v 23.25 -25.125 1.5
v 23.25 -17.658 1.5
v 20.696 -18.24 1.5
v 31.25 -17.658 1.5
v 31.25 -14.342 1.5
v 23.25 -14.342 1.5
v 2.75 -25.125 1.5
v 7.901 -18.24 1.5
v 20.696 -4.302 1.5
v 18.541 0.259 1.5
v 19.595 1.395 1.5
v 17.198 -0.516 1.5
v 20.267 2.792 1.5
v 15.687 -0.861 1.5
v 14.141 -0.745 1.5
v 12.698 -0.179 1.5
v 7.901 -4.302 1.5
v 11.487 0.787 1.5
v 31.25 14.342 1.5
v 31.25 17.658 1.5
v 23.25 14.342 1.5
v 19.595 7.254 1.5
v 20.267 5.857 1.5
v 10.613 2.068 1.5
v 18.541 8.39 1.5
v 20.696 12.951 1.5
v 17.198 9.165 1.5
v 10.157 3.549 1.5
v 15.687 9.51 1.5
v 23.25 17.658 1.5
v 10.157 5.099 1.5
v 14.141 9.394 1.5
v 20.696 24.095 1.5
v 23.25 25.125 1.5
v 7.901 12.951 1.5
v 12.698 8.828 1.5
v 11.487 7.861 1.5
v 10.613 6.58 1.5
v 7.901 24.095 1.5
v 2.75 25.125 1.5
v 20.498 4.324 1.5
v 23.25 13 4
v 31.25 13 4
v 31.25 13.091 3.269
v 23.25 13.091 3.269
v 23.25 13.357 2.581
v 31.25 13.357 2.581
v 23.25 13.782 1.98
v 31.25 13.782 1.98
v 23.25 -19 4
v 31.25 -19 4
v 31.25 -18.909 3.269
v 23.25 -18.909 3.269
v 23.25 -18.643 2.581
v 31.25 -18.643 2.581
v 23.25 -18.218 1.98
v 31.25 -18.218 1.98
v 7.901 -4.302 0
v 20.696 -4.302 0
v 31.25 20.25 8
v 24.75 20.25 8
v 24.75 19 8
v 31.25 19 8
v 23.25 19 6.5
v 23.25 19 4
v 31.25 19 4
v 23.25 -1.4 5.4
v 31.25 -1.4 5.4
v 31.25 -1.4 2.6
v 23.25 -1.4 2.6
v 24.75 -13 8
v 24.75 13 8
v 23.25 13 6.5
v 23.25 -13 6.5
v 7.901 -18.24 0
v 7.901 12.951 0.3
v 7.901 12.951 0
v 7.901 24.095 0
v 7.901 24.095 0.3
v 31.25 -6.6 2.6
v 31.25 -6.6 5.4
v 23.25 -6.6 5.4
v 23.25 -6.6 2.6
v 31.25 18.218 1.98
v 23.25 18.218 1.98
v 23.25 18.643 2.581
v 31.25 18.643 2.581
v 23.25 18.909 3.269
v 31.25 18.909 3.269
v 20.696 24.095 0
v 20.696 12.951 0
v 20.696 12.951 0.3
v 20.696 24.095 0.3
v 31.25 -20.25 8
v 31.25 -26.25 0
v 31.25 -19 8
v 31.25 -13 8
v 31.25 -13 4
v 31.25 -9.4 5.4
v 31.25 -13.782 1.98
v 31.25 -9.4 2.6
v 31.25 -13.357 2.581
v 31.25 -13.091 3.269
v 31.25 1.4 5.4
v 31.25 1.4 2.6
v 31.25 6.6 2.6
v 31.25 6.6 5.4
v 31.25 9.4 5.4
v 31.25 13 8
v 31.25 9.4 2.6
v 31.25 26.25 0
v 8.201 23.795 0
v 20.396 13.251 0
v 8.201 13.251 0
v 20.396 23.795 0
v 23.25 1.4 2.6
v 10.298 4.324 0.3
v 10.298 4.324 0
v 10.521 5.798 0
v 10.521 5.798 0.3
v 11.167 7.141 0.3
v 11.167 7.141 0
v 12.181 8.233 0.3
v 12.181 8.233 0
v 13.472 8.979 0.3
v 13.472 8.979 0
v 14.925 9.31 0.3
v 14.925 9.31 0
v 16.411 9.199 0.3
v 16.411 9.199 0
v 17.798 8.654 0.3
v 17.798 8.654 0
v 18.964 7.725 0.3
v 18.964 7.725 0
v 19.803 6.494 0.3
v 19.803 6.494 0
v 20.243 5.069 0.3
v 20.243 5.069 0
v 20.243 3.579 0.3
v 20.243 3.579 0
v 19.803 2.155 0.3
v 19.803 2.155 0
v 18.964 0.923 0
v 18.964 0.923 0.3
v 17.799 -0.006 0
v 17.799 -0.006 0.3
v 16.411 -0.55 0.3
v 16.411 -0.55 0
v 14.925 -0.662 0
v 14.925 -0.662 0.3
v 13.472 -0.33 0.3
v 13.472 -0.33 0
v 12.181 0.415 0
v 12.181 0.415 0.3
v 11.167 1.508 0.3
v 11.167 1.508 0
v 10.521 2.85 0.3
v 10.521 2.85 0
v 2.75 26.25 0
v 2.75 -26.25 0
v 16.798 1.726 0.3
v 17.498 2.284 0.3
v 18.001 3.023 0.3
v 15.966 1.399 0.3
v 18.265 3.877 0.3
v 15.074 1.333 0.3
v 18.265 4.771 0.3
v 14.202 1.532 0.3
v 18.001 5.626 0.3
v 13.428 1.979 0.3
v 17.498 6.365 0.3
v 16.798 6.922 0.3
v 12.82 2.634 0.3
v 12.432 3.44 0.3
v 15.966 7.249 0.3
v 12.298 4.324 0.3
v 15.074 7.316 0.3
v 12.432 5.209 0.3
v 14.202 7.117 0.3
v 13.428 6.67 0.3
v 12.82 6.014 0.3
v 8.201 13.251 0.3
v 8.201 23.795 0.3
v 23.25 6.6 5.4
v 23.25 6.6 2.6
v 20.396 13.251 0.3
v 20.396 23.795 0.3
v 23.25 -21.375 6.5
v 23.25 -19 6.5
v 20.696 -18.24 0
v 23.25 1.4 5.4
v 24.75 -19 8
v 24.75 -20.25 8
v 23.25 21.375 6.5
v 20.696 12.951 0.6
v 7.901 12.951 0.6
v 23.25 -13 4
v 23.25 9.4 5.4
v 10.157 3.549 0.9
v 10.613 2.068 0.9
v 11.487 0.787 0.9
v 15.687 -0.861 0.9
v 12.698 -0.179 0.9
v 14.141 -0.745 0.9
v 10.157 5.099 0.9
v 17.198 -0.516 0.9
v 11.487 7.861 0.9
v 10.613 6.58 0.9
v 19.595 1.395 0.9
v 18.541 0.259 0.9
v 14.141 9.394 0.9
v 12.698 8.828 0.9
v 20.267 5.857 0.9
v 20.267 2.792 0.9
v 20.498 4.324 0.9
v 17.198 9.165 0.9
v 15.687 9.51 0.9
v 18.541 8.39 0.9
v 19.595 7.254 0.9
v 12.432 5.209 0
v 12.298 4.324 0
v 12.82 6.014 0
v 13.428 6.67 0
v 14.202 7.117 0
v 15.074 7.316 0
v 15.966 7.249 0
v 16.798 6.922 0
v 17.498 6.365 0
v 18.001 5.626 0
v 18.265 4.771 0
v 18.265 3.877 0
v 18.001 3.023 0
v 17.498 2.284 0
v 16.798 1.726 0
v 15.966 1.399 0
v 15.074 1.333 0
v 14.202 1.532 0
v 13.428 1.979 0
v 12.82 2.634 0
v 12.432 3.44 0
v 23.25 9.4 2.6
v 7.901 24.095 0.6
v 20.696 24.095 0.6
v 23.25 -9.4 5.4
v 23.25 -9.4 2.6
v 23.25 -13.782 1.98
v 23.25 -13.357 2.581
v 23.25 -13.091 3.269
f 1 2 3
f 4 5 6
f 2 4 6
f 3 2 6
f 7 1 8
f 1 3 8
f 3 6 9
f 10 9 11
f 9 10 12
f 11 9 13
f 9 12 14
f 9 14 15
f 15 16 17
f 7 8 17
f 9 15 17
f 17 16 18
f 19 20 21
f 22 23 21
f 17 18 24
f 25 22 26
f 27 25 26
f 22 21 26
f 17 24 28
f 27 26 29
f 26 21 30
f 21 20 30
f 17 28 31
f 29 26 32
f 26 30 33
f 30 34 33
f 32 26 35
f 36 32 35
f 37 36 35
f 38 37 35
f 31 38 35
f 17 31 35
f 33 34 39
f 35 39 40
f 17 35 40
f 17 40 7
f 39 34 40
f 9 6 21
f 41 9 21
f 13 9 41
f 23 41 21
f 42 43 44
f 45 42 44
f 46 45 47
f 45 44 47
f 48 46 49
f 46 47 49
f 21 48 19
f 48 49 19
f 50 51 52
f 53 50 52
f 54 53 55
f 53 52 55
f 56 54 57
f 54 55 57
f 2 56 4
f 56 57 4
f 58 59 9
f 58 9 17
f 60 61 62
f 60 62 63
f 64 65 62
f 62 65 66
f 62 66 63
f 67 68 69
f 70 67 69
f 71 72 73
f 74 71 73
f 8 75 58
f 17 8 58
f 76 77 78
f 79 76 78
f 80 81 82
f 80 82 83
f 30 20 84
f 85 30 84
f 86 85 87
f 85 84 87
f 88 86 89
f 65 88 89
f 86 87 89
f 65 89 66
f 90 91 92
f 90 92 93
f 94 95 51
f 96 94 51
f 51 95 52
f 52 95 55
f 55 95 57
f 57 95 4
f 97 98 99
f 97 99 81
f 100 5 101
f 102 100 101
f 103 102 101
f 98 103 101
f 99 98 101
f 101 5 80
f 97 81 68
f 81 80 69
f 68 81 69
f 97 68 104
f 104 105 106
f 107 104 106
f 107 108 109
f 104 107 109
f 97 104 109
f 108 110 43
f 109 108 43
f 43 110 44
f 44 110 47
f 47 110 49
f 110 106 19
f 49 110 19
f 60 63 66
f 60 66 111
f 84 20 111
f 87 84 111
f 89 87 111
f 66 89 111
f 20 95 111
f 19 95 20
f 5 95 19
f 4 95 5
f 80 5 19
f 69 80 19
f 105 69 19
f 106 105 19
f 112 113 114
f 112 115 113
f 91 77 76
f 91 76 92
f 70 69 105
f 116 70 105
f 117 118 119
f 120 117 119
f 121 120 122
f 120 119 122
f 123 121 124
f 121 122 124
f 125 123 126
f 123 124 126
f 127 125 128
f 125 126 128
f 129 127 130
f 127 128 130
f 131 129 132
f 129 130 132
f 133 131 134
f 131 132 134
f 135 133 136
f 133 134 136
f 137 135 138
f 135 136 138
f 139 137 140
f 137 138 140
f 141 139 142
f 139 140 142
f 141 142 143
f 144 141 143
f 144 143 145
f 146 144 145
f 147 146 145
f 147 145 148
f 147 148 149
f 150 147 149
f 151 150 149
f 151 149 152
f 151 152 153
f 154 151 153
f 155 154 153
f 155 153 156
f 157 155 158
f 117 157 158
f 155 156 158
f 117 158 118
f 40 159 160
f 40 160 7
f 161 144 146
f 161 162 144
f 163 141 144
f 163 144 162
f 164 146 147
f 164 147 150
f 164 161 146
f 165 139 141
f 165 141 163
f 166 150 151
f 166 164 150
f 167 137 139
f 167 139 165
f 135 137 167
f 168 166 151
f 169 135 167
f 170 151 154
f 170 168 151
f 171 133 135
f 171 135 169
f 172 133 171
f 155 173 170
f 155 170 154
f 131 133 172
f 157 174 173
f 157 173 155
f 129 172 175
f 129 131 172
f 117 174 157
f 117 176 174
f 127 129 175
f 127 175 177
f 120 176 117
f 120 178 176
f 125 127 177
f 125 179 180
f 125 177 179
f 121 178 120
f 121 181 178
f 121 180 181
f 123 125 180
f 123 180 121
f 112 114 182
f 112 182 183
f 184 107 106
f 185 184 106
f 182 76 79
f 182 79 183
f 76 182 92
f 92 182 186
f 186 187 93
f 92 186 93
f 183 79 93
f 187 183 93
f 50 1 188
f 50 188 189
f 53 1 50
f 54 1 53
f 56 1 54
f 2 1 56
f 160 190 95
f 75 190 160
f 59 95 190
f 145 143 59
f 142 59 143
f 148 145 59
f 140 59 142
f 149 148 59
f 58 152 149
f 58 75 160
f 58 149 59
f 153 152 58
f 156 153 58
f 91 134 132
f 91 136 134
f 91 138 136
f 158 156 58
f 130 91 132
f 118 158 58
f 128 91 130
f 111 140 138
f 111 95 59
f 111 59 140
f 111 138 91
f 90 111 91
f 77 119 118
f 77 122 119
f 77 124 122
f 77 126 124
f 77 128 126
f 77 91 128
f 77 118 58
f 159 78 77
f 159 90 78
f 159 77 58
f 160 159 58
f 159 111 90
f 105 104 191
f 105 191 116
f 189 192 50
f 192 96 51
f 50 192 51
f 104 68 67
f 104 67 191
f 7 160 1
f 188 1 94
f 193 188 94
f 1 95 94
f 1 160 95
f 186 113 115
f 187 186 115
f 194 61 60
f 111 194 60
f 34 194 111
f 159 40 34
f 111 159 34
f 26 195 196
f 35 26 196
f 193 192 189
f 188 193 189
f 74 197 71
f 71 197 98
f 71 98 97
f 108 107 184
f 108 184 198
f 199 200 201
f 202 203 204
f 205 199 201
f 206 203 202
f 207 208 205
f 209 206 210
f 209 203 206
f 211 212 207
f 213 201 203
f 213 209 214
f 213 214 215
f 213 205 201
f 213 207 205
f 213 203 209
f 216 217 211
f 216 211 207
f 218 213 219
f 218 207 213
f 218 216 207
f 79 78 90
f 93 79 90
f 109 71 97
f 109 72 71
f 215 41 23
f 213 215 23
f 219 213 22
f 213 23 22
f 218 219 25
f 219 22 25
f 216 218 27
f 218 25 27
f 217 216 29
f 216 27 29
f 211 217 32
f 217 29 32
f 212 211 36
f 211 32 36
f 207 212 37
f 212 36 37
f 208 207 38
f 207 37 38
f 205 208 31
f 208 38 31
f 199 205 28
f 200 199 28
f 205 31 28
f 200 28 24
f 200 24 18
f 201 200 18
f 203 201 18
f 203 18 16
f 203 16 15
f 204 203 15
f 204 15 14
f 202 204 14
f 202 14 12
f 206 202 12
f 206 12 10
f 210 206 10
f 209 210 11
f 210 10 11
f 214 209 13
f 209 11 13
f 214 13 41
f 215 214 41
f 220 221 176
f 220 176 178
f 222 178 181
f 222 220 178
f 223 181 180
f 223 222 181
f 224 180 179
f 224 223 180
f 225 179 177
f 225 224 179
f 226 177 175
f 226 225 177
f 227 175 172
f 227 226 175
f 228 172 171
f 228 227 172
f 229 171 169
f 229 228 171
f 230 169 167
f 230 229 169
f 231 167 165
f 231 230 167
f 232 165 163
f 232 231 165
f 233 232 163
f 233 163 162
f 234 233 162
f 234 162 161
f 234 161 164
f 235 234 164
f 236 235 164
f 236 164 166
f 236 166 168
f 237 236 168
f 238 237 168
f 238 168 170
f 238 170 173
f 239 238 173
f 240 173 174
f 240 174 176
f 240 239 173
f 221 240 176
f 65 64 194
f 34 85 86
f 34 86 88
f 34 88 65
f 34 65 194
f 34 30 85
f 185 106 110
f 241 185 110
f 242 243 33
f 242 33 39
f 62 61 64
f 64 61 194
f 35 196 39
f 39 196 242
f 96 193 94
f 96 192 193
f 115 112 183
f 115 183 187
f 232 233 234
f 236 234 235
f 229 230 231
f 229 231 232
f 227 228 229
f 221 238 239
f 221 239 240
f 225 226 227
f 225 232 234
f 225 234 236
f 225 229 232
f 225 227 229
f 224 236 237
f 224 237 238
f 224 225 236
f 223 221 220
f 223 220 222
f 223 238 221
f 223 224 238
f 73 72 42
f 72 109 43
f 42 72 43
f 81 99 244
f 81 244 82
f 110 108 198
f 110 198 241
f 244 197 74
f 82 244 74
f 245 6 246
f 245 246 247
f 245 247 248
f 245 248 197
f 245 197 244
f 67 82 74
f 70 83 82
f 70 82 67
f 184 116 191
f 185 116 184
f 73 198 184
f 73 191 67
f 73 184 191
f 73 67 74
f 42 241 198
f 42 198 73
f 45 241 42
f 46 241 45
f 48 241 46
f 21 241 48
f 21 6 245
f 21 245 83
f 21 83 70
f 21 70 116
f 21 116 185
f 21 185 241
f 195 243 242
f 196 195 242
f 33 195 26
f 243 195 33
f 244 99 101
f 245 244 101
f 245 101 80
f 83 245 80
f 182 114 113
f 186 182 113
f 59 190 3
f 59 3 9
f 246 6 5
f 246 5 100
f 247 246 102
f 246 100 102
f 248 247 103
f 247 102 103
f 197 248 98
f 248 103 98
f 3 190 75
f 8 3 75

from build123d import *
from build123d.topology import SkipClean

# Parameters (mm, degrees)
ESBO_O1_R                 = 8.3
RESSALTO_EXTRUS_O1_DEPTH  = 1.5
RESSALTO_EXTRUS_O2_DEPTH  = 6
ESBO_O3_W                 = 2.8
ESBO_O3_H                 = 2.8
CORTE_EXTRUS_O1_DEPTH     = 37.142080737
ESBO_O4_W                 = 2.8
ESBO_O4_H                 = 2.8
CORTE_EXTRUS_O2_DEPTH     = 53.08166664
ESBO_O6_W                 = 5
ESBO_O6_H                 = 25
RESSALTO_EXTRUS_O5_DEPTH  = 7.5
ESBO_O7_W                 = 2.8
ESBO_O7_H                 = 2.8
CORTE_EXTRUS_O3_DEPTH     = 60
RESSALTO_EXTRUS_O3_DEPTH  = 10
ESBO_O8_W                 = 60
ESBO_O8_H                 = 52.5
ESBO_O8_R                 = 8.3
RESSALTO_EXTRUS_O6_DEPTH  = 1.5
CORTE_EXTRUS_O4_DEPTH     = 42.098205557
RESSALTO_EXTRUS_O7_DEPTH  = 6.5
ESBO_O14_W                = 5.7
ESBO_O14_H                = 52.5
CORTE_EXTRUS_O8_DEPTH     = 4.5
CORTE_EXTRUS_O9_DEPTH     = 41.657871317
CORTE_EXTRUS_O13_DEPTH    = 6.25
CORTE_EXTRUS_O14_DEPTH    = 6.25
ESBO_O12_R                = 1.65
CORTE_EXTRUS_O15_DEPTH    = 4.5
CORTE_EXTRUS_O17_DEPTH    = 62.398717413
ESBO_O20_R                = 3.5
CORTE_EXTRUS_O18_DEPTH    = 5
RESSALTO_EXTRUS_O8_START  = 2.95
ESBO_O21_R                = 1.65
RESSALTO_EXTRUS_O8_DEPTH  = 2.95
ESBO_O22_W                = 2.8
ESBO_O22_H                = 2.8
RESSALTO_EXTRUS_O9_DEPTH  = 1.25
CORTE_EXTRUS_O19_DEPTH    = 6
ESBO_O24_W                = 8
ESBO_O24_H                = 50.25
RESSALTO_EXTRUS_O10_DEPTH = 6.5
CORTE_EXTRUS_O20_DEPTH    = 62.222570389
CORTE_EXTRUS_O21_REACH    = 67.143
ESBO_O26_W                = 2.8
ESBO_O26_H                = 2.8
CORTE_EXTRUS_O22_REACH    = 67.143
CORTE_EXTRUS_O23_DEPTH    = 6.5
CORTE_EXTRUS_O24_DEPTH    = 6.5
CORTE_EXTRUS_O25_START    = -6.5
CORTE_EXTRUS_O25_DEPTH    = 6.5
CORTE_EXTRUS_O26_DEPTH    = 4.95
ESBO_O33_R                = 9.3
CORTE_EXTRUS_O27_DEPTH    = 43.019340785
ESBO_O34_R                = 8.3
RESSALTO_EXTRUS_O11_DEPTH = 1.5
ESBO_O49_R                = 41.403192139
CORTE_EXTRUS_O37_DEPTH    = 28.5
ESBO_O50_W                = 12.795
ESBO_O50_H                = 13.938
ESBO_O50_H_2              = 11.144
CORTE_EXTRUS_O38_DEPTH    = 42.588760501
ESBO_O51_R                = 5.2
CORTE_EXTRUS_O39_DEPTH    = 0.6
ESBO_O52_R                = 31.470560184
CORTE_EXTRUS_O40_DEPTH    = 1.5
ESBO_O54_R                = 5
ESBO_O54_R_2              = 3
CORTE_EXTRUS_O41_DEPTH    = 0.3
ESBO_O56_W                = 12.795
ESBO_O56_H                = 11.144
RESSALTO_EXTRUS_O13_DEPTH = 0.6
ESBO_O57_W                = 12.795
ESBO_O57_H                = 11.144
ESBO_O57_W_2              = 12.195
ESBO_O57_H_2              = 10.544
CORTE_EXTRUS_O44_DEPTH    = 0.3


with BuildPart() as part:
    # Esboço1 → Ressalto-extrusão1 (new body)
    with BuildSketch(Plane.XY):
        Polygon((-25, -12.5), (-25, 12.5), (25, 12.5), (25, -12.5), (15, -12.5), (-15, -12.5), align=None)
        with Locations((-13, 0)):
            Circle(ESBO_O1_R, mode=Mode.SUBTRACT)
        with Locations(Location((13, 0, 0), (0, 0, 180))):
            Circle(ESBO_O1_R, mode=Mode.SUBTRACT)
    extrude(amount=RESSALTO_EXTRUS_O1_DEPTH)

    # Esboço2 → Ressalto-extrusão2 (add)
    with BuildSketch(Plane.XY.offset(1.5)):
        Polygon((-20, -12.5), (-25, -12.5), (-25, -2.5), (-22, -2.5), (-22, -9.5), (-15, -9.5), (-15, -12.5), align=None)
        Polygon((22, -2.5), (22, -9.5), (15, -9.5), (15, -12.5), (20, -12.5), (25, -12.5), (25, -2.5), align=None)
        Polygon((20, 12.5), (25, 12.5), (25, 2.5), (22, 2.5), (22, 9.5), (15, 9.5), (15, 12.5), align=None)
        Polygon((-22, 2.5), (-22, 9.5), (-15, 9.5), (-15, 12.5), (-20, 12.5), (-25, 12.5), (-25, 2.5), align=None)
    extrude(amount=RESSALTO_EXTRUS_O2_DEPTH)

    # Esboço3 → Corte-extrusão1 (cut, through all)
    with BuildSketch(Plane.XZ.offset(12.5)):
        with Locations((-20, 3.75)):
            Rectangle(ESBO_O3_W, ESBO_O3_H)
        with Locations((20, 3.75)):
            Rectangle(ESBO_O3_W, ESBO_O3_H)
    extrude(amount=-CORTE_EXTRUS_O1_DEPTH, mode=Mode.SUBTRACT)

    # Esboço4 → Corte-extrusão2 (cut, through all)
    with BuildSketch(Plane.ZY.offset(25)):
        with Locations((3.75, 7.5)):
            Rectangle(ESBO_O4_W, ESBO_O4_H)
        with Locations((3.75, -7.5)):
            Rectangle(ESBO_O4_W, ESBO_O4_H)
    extrude(amount=-CORTE_EXTRUS_O2_DEPTH, mode=Mode.SUBTRACT)

    # Esboço6 → Ressalto-extrusão5 (add)
    with BuildSketch(Plane(origin=(0, 0, 0), x_dir=(-1, 0, 0), z_dir=(0, 0, -1))):
        with Locations((-27.5, 0)):
            Rectangle(ESBO_O6_W, ESBO_O6_H)
        with Locations((27.5, 0)):
            Rectangle(ESBO_O6_W, ESBO_O6_H)
    extrude(amount=-RESSALTO_EXTRUS_O5_DEPTH)

    # Esboço7 → Corte-extrusão3 (cut)
    with BuildSketch(Plane(origin=(30, 0, 0), x_dir=(0, 0, -1), z_dir=(1, 0, 0))):
        with Locations((-3.75, -7.5)):
            Rectangle(ESBO_O7_W, ESBO_O7_H)
        with Locations((-3.75, 7.5)):
            Rectangle(ESBO_O7_W, ESBO_O7_H)
    extrude(amount=-CORTE_EXTRUS_O3_DEPTH, mode=Mode.SUBTRACT)

    # Esboço5 → Ressalto-extrusão3 (add)
    with SkipClean():  # the faces are left unmerged after this step: merging them gives an invalid solid
        with BuildSketch(Plane.XY.offset(1.5)):
            with BuildLine():
                Line((-9, -7.272551134), (-9, -8.395832299))
                ThreePointArc((-9, -8.395832299), (-3.7, 0), (-9, 8.395832299))
                Line((-9, 8.395832299), (-9, 7.272551134))
                ThreePointArc((-9, 7.272551134), (-4.7, 0), (-9, -7.272551134))
            make_face()
            with BuildLine():
                Line((-17, -7.272551134), (-17, -8.395832299))
                ThreePointArc((-17, -8.395832299), (-22.3, 0), (-17, 8.395832299))
                Line((-17, 8.395832299), (-17, 7.272551134))
                ThreePointArc((-17, 7.272551134), (-21.3, 0), (-17, -7.272551134))
            make_face()
            with BuildLine():
                Line((9, -7.272551134), (9, -8.395832299))
                ThreePointArc((9, -8.395832299), (3.7, 0), (9, 8.395832299))
                Line((9, 8.395832299), (9, 7.272551134))
                ThreePointArc((9, 7.272551134), (4.7, 0), (9, -7.272551134))
            make_face()
            with BuildLine():
                Line((17, 8.395832299), (17, 7.272551134))
                ThreePointArc((17, 7.272551134), (21.3, 0), (17, -7.272551134))
                Line((17, -7.272551134), (17, -8.395832299))
                ThreePointArc((17, -8.395832299), (22.3, 0), (17, 8.395832299))
            make_face()
        extrude(amount=RESSALTO_EXTRUS_O3_DEPTH)

    # Esboço8 → Ressalto-extrusão6 (add)
    with SkipClean():  # the faces are left unmerged after this step: merging them gives an invalid solid
        with BuildSketch(Plane(origin=(0, 0, 0), x_dir=(-1, 0, 0), z_dir=(0, 0, -1))):
            Rectangle(ESBO_O8_W, ESBO_O8_H)
            with Locations(Location((13, 0, 0), (0, 0, 298.811379709))):
                Circle(ESBO_O8_R, mode=Mode.SUBTRACT)
            with Locations((-13, 0)):
                Circle(ESBO_O8_R, mode=Mode.SUBTRACT)
        extrude(amount=-RESSALTO_EXTRUS_O6_DEPTH)

    # Esboço9 → Corte-extrusão4 (cut, through all)
    with SkipClean():  # the faces are left unmerged after this step: merging them gives an invalid solid
        with BuildSketch(Plane.XY.offset(1.5)):
            Polygon((-15, -12.5), (-15, -9.5), (-22, -9.5), (-22, -2.5), (-25, -2.5), (-25, 2.5), (-22, 2.5), (-22, 9.5), (-15, 9.5), (-15, 12.5), (-30, 12.5), (-30, -12.5), align=None)
        extrude(amount=CORTE_EXTRUS_O4_DEPTH, mode=Mode.SUBTRACT)

    # Esboço10 → Ressalto-extrusão7 (add)
    with SkipClean():  # the faces are left unmerged after this step: merging them gives an invalid solid
        with BuildSketch(Plane.XY.offset(1.5)):
            Polygon((-24.3, -26.25), (-24.3, 26.25), (-22.3, 26.25), (-17.3, 26.25), (-17.3, 20), (-22.3, 20), (-22.3, 12), (-17.3, 12), (-17.3, -12), (-22.3, -12), (-22.3, -20), (-17.3, -20), (-17.3, -26.25), (-22.3, -26.25), align=None)
        extrude(amount=RESSALTO_EXTRUS_O7_DEPTH)

    # Esboço14 → Corte-extrusão8 (cut)
    with SkipClean():  # the faces are left unmerged after this step: merging them gives an invalid solid
        with BuildSketch(Plane.XY.offset(1.5)):
            with Locations((-27.15, 0)):
                Rectangle(ESBO_O14_W, ESBO_O14_H)
        extrude(amount=-CORTE_EXTRUS_O8_DEPTH, mode=Mode.SUBTRACT)

    # Esboço15 → Corte-extrusão9 (cut, through all)
    with SkipClean():  # the faces are left unmerged after this step: merging them gives an invalid solid
        with BuildSketch(Plane.XY.offset(8)):
            with BuildLine():
                Line((-17.3, -7.09929574), (-17.3, 7.09929574))
                ThreePointArc((-17.3, 7.09929574), (-21.3, 0), (-17.3, -7.09929574))
            make_face()
        extrude(amount=-CORTE_EXTRUS_O9_DEPTH, mode=Mode.SUBTRACT)

    # Esboço11 → Corte-extrusão13 (cut)
    with SkipClean():  # the faces are left unmerged after this step: merging them gives an invalid solid
        with BuildSketch(Plane.XZ.offset(26.25)):
            Polygon((-22.3, 8), (-17.3, 8), (-17.3, 1.5), align=None)
        extrude(amount=-CORTE_EXTRUS_O13_DEPTH, mode=Mode.SUBTRACT)

    # Esboço17 → Corte-extrusão14 (cut)
    with SkipClean():  # the faces are left unmerged after this step: merging them gives an invalid solid
        with BuildSketch(Plane(origin=(0, 26.25, 0), x_dir=(1, 0, 0), z_dir=(0, 1, 0))):
            Polygon((-17.3, -1.5), (-17.3, -8), (-22.3, -8), align=None)
        extrude(amount=-CORTE_EXTRUS_O14_DEPTH, mode=Mode.SUBTRACT)

    # Esboço12 → Corte-extrusão15 (cut)
    with SkipClean():  # the faces are left unmerged after this step: merging them gives an invalid solid
        with BuildSketch(Plane.ZY.offset(24.3)):
            with Locations(Location((4, 16, 0), (0, 0, 270))):
                Circle(ESBO_O12_R)
            with Locations((4, -16)):
                Circle(ESBO_O12_R)
        extrude(amount=-CORTE_EXTRUS_O15_DEPTH, mode=Mode.SUBTRACT)

    # Esboço19 → Corte-extrusão17 (cut, through all)
    with SkipClean():  # the faces are left unmerged after this step: merging them gives an invalid solid
        with BuildSketch(Plane.ZY.offset(24.3)):
            Polygon((0, 26.25), (8, 26.25), (8, 20.25), align=None)
            Polygon((8, -20.25), (0, -26.25), (8, -26.25), align=None)
        extrude(amount=-CORTE_EXTRUS_O17_DEPTH, mode=Mode.SUBTRACT)

    # Esboço20 → Corte-extrusão18 (cut)
    with SkipClean():  # the faces are left unmerged after this step: merging them gives an invalid solid
        with BuildSketch(Plane(origin=(-22.3, 0, 0), x_dir=(0, 0, -1), z_dir=(1, 0, 0))):
            with Locations((-4, -16)):
                Circle(ESBO_O20_R)
            with Locations((-4, 16)):
                Circle(ESBO_O20_R)
        extrude(amount=CORTE_EXTRUS_O18_DEPTH, mode=Mode.SUBTRACT)

    # Esboço21 → Ressalto-extrusão8 (add)
    with SkipClean():  # the faces are left unmerged after this step: merging them gives an invalid solid
        with BuildSketch(Plane.ZY.offset(24.3).offset(RESSALTO_EXTRUS_O8_START)):
            Polygon((0, 26.25), (0, -26.25), (8, -20.25), (8, 20.25), align=None)
            with Locations(Location((4, -16, 0), (0, 0, 270))):
                Circle(ESBO_O21_R, mode=Mode.SUBTRACT)
            with Locations(Location((4, 16, 0), (0, 0, 270))):
                Circle(ESBO_O21_R, mode=Mode.SUBTRACT)
        extrude(amount=-RESSALTO_EXTRUS_O8_DEPTH)

    # Esboço22 → Ressalto-extrusão9 (add)
    with SkipClean():  # the faces are left unmerged after this step: merging them gives an invalid solid
        with BuildSketch(Plane(origin=(30, 0, 0), x_dir=(0, 0, -1), z_dir=(1, 0, 0))):
            Polygon((-1.5, -25.125), (0, -26.25), (0, 26.25), (-1.5, 25.125), (-1.5, 12.5), (-7.5, 12.5), (-7.5, -12.5), (-1.5, -12.5), align=None)
            with Locations((-3.75, -7.5)):
                Rectangle(ESBO_O22_W, ESBO_O22_H, mode=Mode.SUBTRACT)
            with Locations((-3.75, 7.5)):
                Rectangle(ESBO_O22_W, ESBO_O22_H, mode=Mode.SUBTRACT)
        extrude(amount=RESSALTO_EXTRUS_O9_DEPTH)

    # Esboço23 → Corte-extrusão19 (cut)
    with SkipClean():  # the faces are left unmerged after this step: merging them gives an invalid solid
        with BuildSketch(Plane.XY.offset(7.5)):
            Polygon((25, -2.5), (22, -2.5), (22, -9.5), (15, -9.5), (15, -12.5), (31.25, -12.5), (31.25, 12.5), (15, 12.5), (15, 9.5), (22, 9.5), (22, 2.5), (25, 2.5), align=None)
        extrude(amount=-CORTE_EXTRUS_O19_DEPTH, mode=Mode.SUBTRACT)

    # Esboço24 → Ressalto-extrusão10 (add)
    with SkipClean():  # the faces are left unmerged after this step: merging them gives an invalid solid
        with BuildSketch(Plane.XY.offset(1.5)):
            with Locations((27.25, 0)):
                Rectangle(ESBO_O24_W, ESBO_O24_H)
        extrude(amount=RESSALTO_EXTRUS_O10_DEPTH)

    # Esboço25 → Corte-extrusão20 (cut, through all)
    with SkipClean():  # the faces are left unmerged after this step: merging them gives an invalid solid
        with BuildSketch(Plane(origin=(0, 25.125, 0), x_dir=(1, 0, 0), z_dir=(0, 1, 0))):
            Polygon((23.25, -6.5), (23.25, -8), (24.75, -8), align=None)
        extrude(amount=-CORTE_EXTRUS_O20_DEPTH, mode=Mode.SUBTRACT)

    # Esboço26 → Corte-extrusão21 (cut, up to next)
    with BuildSketch(Plane(origin=(31.25, 0, 0), x_dir=(0, 0, -1), z_dir=(1, 0, 0)), mode=Mode.PRIVATE) as corte_extrus_o21_sk1:
        with Locations((-4, 0)):
            Rectangle(ESBO_O26_W, ESBO_O26_H)
    corte_extrus_o21_tool1 = extrude(corte_extrus_o21_sk1.sketch, amount=-CORTE_EXTRUS_O21_REACH, mode=Mode.PRIVATE) & part.part
    # Esboço26 → Corte-extrusão21 (cut, up to next)
    with BuildSketch(Plane(origin=(31.25, 0, 0), x_dir=(0, 0, -1), z_dir=(1, 0, 0)), mode=Mode.PRIVATE) as corte_extrus_o21_sk2:
        with Locations((-4, -8)):
            Rectangle(ESBO_O26_W, ESBO_O26_H)
    corte_extrus_o21_tool2 = extrude(corte_extrus_o21_sk2.sketch, amount=-CORTE_EXTRUS_O21_REACH, mode=Mode.PRIVATE) & part.part
    # Esboço26 → Corte-extrusão21 (cut, up to next)
    with BuildSketch(Plane(origin=(31.25, 0, 0), x_dir=(0, 0, -1), z_dir=(1, 0, 0)), mode=Mode.PRIVATE) as corte_extrus_o21_sk3:
        with Locations((-4, 8)):
            Rectangle(ESBO_O26_W, ESBO_O26_H)
    corte_extrus_o21_tool3 = extrude(corte_extrus_o21_sk3.sketch, amount=-CORTE_EXTRUS_O21_REACH, mode=Mode.PRIVATE) & part.part
    add(corte_extrus_o21_tool1.solids().sort_by_distance((31.25, 0, 4))[0], mode=Mode.SUBTRACT)
    add(corte_extrus_o21_tool2.solids().sort_by_distance((31.25, -8, 4))[0], mode=Mode.SUBTRACT)
    add(corte_extrus_o21_tool3.solids().sort_by_distance((31.25, 8, 4))[0], mode=Mode.SUBTRACT)

    # Esboço27 → Corte-extrusão22 (cut, up to next)
    with BuildSketch(Plane(origin=(31.25, 0, 0), x_dir=(0, 0, -1), z_dir=(1, 0, 0)), mode=Mode.PRIVATE) as corte_extrus_o22_sk1:
        with BuildLine():
            Line((-4, 19), (-8, 19))
            Line((-8, 19), (-8, 13))
            Line((-8, 13), (-4, 13))
            ThreePointArc((-4, 13), (-2.581362835, 13.356617963), (-1.5, 14.341687605))
            Line((-1.5, 14.341687605), (-1.5, 17.658312395))
            ThreePointArc((-1.5, 17.658312395), (-2.581362835, 18.643382037), (-4, 19))
        make_face()
    corte_extrus_o22_tool1 = extrude(corte_extrus_o22_sk1.sketch, amount=-CORTE_EXTRUS_O22_REACH, mode=Mode.PRIVATE) & part.part
    # Esboço27 → Corte-extrusão22 (cut, up to next)
    with BuildSketch(Plane(origin=(31.25, 0, 0), x_dir=(0, 0, -1), z_dir=(1, 0, 0)), mode=Mode.PRIVATE) as corte_extrus_o22_sk2:
        Polygon((-8, -20.25), (-8, -25.125), (-1.5, -25.125), align=None)
    corte_extrus_o22_tool2 = extrude(corte_extrus_o22_sk2.sketch, amount=-CORTE_EXTRUS_O22_REACH, mode=Mode.PRIVATE) & part.part
    # Esboço27 → Corte-extrusão22 (cut, up to next)
    with BuildSketch(Plane(origin=(31.25, 0, 0), x_dir=(0, 0, -1), z_dir=(1, 0, 0)), mode=Mode.PRIVATE) as corte_extrus_o22_sk3:
        Polygon((-8, 25.125), (-8, 20.25), (-1.5, 25.125), align=None)
    corte_extrus_o22_tool3 = extrude(corte_extrus_o22_sk3.sketch, amount=-CORTE_EXTRUS_O22_REACH, mode=Mode.PRIVATE) & part.part
    # Esboço27 → Corte-extrusão22 (cut, up to next)
    with BuildSketch(Plane(origin=(31.25, 0, 0), x_dir=(0, 0, -1), z_dir=(1, 0, 0)), mode=Mode.PRIVATE) as corte_extrus_o22_sk4:
        with BuildLine():
            Line((-4, -13), (-8, -13))
            Line((-8, -13), (-8, -19))
            Line((-8, -19), (-4, -19))
            ThreePointArc((-4, -19), (-2.581362835, -18.643382037), (-1.5, -17.658312395))
            Line((-1.5, -17.658312395), (-1.5, -14.341687605))
            ThreePointArc((-1.5, -14.341687605), (-2.581362835, -13.356617963), (-4, -13))
        make_face()
    corte_extrus_o22_tool4 = extrude(corte_extrus_o22_sk4.sketch, amount=-CORTE_EXTRUS_O22_REACH, mode=Mode.PRIVATE) & part.part
    add(corte_extrus_o22_tool1.solids().sort_by_distance((31.25, 16, 4.892695))[0], mode=Mode.SUBTRACT)
    add(corte_extrus_o22_tool2.solids().sort_by_distance((31.25, -23.5, 5.833333))[0], mode=Mode.SUBTRACT)
    add(corte_extrus_o22_tool3.solids().sort_by_distance((31.25, 23.5, 5.833333))[0], mode=Mode.SUBTRACT)
    add(corte_extrus_o22_tool4.solids().sort_by_distance((31.25, -16, 4.892695))[0], mode=Mode.SUBTRACT)

    # Esboço28 → Corte-extrusão23 (cut)
    with SkipClean():  # the faces are left unmerged after this step: merging them gives an invalid solid
        with BuildSketch(Plane.XY.offset(8)):
            with BuildLine():
                Line((-27.25, 12), (-27.25, -12))
                Line((-27.25, -12), (-24.8, -12))
                ThreePointArc((-24.8, -12), (-23.032233047, -11.267766953), (-22.3, -9.5))
                Line((-22.3, -9.5), (-22.3, 9.5))
                ThreePointArc((-22.3, 9.5), (-23.032233047, 11.267766953), (-24.8, 12))
                Line((-24.8, 12), (-27.25, 12))
            make_face()
        extrude(amount=-CORTE_EXTRUS_O23_DEPTH, mode=Mode.SUBTRACT)

    # Esboço29 → Corte-extrusão24 (cut)
    with SkipClean():  # the faces are left unmerged after this step: merging them gives an invalid solid
        with BuildSketch(Plane.XY.offset(8)):
            with BuildLine():
                Line((-19.8, -12), (-19.8, -12.44923286))
                Line((-19.8, -12.44923286), (-19.8, -14.139655276))
                Line((-19.8, -14.139655276), (-15.225886581, -14.139655276))
                Line((-15.225886581, -14.139655276), (-15.225886581, -9.5))
                Line((-15.225886581, -9.5), (-17.3, -9.5))
                ThreePointArc((-17.3, -9.5), (-18.032233047, -11.267766953), (-19.8, -12))
            make_face()
            with BuildLine():
                Line((-19.8, 12), (-19.8, 12.907103379))
                Line((-19.8, 12.907103379), (-15.750500434, 12.907103379))
                Line((-15.750500434, 12.907103379), (-15.750500434, 9.5))
                Line((-15.750500434, 9.5), (-17.3, 9.5))
                ThreePointArc((-17.3, 9.5), (-18.032233047, 11.267766953), (-19.8, 12))
            make_face()
        extrude(amount=-CORTE_EXTRUS_O24_DEPTH, mode=Mode.SUBTRACT)

    # Esboço30 → Corte-extrusão25 (cut)
    with SkipClean():  # the faces are left unmerged after this step: merging them gives an invalid solid
        with BuildSketch(Plane.XY.offset(8).offset(CORTE_EXTRUS_O25_START)):
            with BuildLine():
                Line((-27.25, 12), (-17, 12))
                Line((-17, 12), (-17, 8.395832299))
                ThreePointArc((-17, 8.395832299), (-22.3, 0), (-17, -8.395832299))
                Line((-17, -8.395832299), (-17, -12))
                Line((-17, -12), (-27.25, -12))
                Line((-27.25, -12), (-27.25, 12))
            make_face()
        extrude(amount=CORTE_EXTRUS_O25_DEPTH, mode=Mode.SUBTRACT)

    # Esboço31 → Corte-extrusão26 (cut)
    with SkipClean():  # the faces are left unmerged after this step: merging them gives an invalid solid
        with BuildSketch(Plane.ZY.offset(27.25)):
            with BuildLine():
                Line((5.5, -12), (8, -12))
                Line((8, -12), (8, -14.5))
                ThreePointArc((8, -14.5), (7.267766953, -12.732233047), (5.5, -12))
            make_face()
            with BuildLine():
                Line((5.5, 12), (8, 12))
                Line((8, 12), (8, 14.5))
                ThreePointArc((8, 14.5), (7.267766953, 12.732233047), (5.5, 12))
            make_face()
        extrude(amount=-CORTE_EXTRUS_O26_DEPTH, mode=Mode.SUBTRACT)

    # Esboço33 → Corte-extrusão27 (cut, through all)
    with BuildSketch(Plane.XY.offset(1.5)):
        with Locations((13, 0)):
            Circle(ESBO_O33_R)
        with Locations((-13, 0)):
            Circle(ESBO_O33_R)
    extrude(amount=CORTE_EXTRUS_O27_DEPTH, mode=Mode.SUBTRACT)

    # Esboço34 → Ressalto-extrusão11 (add)
    with BuildSketch(Plane(origin=(0, 0, 0), x_dir=(-1, 0, 0), z_dir=(0, 0, -1))):
        with Locations((-13, 0)):
            Circle(ESBO_O34_R)
        with Locations((13, 0)):
            Circle(ESBO_O34_R)
    extrude(amount=-RESSALTO_EXTRUS_O11_DEPTH)

    # Esboço49 → Corte-extrusão37 (cut)
    with BuildSketch(Plane.ZY.offset(27.25)):
        Circle(ESBO_O49_R)
    extrude(amount=-CORTE_EXTRUS_O37_DEPTH, mode=Mode.SUBTRACT)

    # Esboço50 → Corte-extrusão38 (cut, through all)
    with BuildSketch(Plane(origin=(0, 0, 0), x_dir=(-1, 0, 0), z_dir=(0, 0, -1))):
        with Locations((-14.2985, -11.271349979)):
            Rectangle(ESBO_O50_W, ESBO_O50_H)
        with Locations((-14.2985, 18.522850021)):
            Rectangle(ESBO_O50_W, ESBO_O50_H_2)
    extrude(amount=-CORTE_EXTRUS_O38_DEPTH, mode=Mode.SUBTRACT)

    # Esboço51 → Corte-extrusão39 (cut)
    with BuildSketch(Plane.XY.offset(1.5)):
        with Locations((15.2985, 4.324250021)):
            Circle(ESBO_O51_R)
    extrude(amount=-CORTE_EXTRUS_O39_DEPTH, mode=Mode.SUBTRACT)

    # Esboço52 → Corte-extrusão40 (cut)
    with BuildSketch(Plane.ZY.offset(-1.25)):
        Circle(ESBO_O52_R)
    extrude(amount=-CORTE_EXTRUS_O40_DEPTH, mode=Mode.SUBTRACT)

    # Esboço54 → Corte-extrusão41 (cut)
    with BuildSketch(Plane(origin=(0, 0, 0), x_dir=(-1, 0, 0), z_dir=(0, 0, -1))):
        with Locations((-15.2985, 4.324250021)):
            Circle(ESBO_O54_R)
        with Locations((-15.2985, 4.324250021)):
            Circle(ESBO_O54_R_2, mode=Mode.SUBTRACT)
    extrude(amount=-CORTE_EXTRUS_O41_DEPTH, mode=Mode.SUBTRACT)

    # Esboço56 → Ressalto-extrusão13 (add)
    with BuildSketch(Plane(origin=(0, 0, 0), x_dir=(-1, 0, 0), z_dir=(0, 0, -1))):
        with Locations((-14.2985, 18.522850021)):
            Rectangle(ESBO_O56_W, ESBO_O56_H)
    extrude(amount=-RESSALTO_EXTRUS_O13_DEPTH)

    # Esboço57 → Corte-extrusão44 (cut)
    with BuildSketch(Plane.XY):
        with Locations((14.2985, 18.522850021)):
            Rectangle(ESBO_O57_W, ESBO_O57_H)
        with Locations((14.2985, 18.522850021)):
            Rectangle(ESBO_O57_W_2, ESBO_O57_H_2, mode=Mode.SUBTRACT)
    extrude(amount=CORTE_EXTRUS_O44_DEPTH, mode=Mode.SUBTRACT)


solid = part.part
